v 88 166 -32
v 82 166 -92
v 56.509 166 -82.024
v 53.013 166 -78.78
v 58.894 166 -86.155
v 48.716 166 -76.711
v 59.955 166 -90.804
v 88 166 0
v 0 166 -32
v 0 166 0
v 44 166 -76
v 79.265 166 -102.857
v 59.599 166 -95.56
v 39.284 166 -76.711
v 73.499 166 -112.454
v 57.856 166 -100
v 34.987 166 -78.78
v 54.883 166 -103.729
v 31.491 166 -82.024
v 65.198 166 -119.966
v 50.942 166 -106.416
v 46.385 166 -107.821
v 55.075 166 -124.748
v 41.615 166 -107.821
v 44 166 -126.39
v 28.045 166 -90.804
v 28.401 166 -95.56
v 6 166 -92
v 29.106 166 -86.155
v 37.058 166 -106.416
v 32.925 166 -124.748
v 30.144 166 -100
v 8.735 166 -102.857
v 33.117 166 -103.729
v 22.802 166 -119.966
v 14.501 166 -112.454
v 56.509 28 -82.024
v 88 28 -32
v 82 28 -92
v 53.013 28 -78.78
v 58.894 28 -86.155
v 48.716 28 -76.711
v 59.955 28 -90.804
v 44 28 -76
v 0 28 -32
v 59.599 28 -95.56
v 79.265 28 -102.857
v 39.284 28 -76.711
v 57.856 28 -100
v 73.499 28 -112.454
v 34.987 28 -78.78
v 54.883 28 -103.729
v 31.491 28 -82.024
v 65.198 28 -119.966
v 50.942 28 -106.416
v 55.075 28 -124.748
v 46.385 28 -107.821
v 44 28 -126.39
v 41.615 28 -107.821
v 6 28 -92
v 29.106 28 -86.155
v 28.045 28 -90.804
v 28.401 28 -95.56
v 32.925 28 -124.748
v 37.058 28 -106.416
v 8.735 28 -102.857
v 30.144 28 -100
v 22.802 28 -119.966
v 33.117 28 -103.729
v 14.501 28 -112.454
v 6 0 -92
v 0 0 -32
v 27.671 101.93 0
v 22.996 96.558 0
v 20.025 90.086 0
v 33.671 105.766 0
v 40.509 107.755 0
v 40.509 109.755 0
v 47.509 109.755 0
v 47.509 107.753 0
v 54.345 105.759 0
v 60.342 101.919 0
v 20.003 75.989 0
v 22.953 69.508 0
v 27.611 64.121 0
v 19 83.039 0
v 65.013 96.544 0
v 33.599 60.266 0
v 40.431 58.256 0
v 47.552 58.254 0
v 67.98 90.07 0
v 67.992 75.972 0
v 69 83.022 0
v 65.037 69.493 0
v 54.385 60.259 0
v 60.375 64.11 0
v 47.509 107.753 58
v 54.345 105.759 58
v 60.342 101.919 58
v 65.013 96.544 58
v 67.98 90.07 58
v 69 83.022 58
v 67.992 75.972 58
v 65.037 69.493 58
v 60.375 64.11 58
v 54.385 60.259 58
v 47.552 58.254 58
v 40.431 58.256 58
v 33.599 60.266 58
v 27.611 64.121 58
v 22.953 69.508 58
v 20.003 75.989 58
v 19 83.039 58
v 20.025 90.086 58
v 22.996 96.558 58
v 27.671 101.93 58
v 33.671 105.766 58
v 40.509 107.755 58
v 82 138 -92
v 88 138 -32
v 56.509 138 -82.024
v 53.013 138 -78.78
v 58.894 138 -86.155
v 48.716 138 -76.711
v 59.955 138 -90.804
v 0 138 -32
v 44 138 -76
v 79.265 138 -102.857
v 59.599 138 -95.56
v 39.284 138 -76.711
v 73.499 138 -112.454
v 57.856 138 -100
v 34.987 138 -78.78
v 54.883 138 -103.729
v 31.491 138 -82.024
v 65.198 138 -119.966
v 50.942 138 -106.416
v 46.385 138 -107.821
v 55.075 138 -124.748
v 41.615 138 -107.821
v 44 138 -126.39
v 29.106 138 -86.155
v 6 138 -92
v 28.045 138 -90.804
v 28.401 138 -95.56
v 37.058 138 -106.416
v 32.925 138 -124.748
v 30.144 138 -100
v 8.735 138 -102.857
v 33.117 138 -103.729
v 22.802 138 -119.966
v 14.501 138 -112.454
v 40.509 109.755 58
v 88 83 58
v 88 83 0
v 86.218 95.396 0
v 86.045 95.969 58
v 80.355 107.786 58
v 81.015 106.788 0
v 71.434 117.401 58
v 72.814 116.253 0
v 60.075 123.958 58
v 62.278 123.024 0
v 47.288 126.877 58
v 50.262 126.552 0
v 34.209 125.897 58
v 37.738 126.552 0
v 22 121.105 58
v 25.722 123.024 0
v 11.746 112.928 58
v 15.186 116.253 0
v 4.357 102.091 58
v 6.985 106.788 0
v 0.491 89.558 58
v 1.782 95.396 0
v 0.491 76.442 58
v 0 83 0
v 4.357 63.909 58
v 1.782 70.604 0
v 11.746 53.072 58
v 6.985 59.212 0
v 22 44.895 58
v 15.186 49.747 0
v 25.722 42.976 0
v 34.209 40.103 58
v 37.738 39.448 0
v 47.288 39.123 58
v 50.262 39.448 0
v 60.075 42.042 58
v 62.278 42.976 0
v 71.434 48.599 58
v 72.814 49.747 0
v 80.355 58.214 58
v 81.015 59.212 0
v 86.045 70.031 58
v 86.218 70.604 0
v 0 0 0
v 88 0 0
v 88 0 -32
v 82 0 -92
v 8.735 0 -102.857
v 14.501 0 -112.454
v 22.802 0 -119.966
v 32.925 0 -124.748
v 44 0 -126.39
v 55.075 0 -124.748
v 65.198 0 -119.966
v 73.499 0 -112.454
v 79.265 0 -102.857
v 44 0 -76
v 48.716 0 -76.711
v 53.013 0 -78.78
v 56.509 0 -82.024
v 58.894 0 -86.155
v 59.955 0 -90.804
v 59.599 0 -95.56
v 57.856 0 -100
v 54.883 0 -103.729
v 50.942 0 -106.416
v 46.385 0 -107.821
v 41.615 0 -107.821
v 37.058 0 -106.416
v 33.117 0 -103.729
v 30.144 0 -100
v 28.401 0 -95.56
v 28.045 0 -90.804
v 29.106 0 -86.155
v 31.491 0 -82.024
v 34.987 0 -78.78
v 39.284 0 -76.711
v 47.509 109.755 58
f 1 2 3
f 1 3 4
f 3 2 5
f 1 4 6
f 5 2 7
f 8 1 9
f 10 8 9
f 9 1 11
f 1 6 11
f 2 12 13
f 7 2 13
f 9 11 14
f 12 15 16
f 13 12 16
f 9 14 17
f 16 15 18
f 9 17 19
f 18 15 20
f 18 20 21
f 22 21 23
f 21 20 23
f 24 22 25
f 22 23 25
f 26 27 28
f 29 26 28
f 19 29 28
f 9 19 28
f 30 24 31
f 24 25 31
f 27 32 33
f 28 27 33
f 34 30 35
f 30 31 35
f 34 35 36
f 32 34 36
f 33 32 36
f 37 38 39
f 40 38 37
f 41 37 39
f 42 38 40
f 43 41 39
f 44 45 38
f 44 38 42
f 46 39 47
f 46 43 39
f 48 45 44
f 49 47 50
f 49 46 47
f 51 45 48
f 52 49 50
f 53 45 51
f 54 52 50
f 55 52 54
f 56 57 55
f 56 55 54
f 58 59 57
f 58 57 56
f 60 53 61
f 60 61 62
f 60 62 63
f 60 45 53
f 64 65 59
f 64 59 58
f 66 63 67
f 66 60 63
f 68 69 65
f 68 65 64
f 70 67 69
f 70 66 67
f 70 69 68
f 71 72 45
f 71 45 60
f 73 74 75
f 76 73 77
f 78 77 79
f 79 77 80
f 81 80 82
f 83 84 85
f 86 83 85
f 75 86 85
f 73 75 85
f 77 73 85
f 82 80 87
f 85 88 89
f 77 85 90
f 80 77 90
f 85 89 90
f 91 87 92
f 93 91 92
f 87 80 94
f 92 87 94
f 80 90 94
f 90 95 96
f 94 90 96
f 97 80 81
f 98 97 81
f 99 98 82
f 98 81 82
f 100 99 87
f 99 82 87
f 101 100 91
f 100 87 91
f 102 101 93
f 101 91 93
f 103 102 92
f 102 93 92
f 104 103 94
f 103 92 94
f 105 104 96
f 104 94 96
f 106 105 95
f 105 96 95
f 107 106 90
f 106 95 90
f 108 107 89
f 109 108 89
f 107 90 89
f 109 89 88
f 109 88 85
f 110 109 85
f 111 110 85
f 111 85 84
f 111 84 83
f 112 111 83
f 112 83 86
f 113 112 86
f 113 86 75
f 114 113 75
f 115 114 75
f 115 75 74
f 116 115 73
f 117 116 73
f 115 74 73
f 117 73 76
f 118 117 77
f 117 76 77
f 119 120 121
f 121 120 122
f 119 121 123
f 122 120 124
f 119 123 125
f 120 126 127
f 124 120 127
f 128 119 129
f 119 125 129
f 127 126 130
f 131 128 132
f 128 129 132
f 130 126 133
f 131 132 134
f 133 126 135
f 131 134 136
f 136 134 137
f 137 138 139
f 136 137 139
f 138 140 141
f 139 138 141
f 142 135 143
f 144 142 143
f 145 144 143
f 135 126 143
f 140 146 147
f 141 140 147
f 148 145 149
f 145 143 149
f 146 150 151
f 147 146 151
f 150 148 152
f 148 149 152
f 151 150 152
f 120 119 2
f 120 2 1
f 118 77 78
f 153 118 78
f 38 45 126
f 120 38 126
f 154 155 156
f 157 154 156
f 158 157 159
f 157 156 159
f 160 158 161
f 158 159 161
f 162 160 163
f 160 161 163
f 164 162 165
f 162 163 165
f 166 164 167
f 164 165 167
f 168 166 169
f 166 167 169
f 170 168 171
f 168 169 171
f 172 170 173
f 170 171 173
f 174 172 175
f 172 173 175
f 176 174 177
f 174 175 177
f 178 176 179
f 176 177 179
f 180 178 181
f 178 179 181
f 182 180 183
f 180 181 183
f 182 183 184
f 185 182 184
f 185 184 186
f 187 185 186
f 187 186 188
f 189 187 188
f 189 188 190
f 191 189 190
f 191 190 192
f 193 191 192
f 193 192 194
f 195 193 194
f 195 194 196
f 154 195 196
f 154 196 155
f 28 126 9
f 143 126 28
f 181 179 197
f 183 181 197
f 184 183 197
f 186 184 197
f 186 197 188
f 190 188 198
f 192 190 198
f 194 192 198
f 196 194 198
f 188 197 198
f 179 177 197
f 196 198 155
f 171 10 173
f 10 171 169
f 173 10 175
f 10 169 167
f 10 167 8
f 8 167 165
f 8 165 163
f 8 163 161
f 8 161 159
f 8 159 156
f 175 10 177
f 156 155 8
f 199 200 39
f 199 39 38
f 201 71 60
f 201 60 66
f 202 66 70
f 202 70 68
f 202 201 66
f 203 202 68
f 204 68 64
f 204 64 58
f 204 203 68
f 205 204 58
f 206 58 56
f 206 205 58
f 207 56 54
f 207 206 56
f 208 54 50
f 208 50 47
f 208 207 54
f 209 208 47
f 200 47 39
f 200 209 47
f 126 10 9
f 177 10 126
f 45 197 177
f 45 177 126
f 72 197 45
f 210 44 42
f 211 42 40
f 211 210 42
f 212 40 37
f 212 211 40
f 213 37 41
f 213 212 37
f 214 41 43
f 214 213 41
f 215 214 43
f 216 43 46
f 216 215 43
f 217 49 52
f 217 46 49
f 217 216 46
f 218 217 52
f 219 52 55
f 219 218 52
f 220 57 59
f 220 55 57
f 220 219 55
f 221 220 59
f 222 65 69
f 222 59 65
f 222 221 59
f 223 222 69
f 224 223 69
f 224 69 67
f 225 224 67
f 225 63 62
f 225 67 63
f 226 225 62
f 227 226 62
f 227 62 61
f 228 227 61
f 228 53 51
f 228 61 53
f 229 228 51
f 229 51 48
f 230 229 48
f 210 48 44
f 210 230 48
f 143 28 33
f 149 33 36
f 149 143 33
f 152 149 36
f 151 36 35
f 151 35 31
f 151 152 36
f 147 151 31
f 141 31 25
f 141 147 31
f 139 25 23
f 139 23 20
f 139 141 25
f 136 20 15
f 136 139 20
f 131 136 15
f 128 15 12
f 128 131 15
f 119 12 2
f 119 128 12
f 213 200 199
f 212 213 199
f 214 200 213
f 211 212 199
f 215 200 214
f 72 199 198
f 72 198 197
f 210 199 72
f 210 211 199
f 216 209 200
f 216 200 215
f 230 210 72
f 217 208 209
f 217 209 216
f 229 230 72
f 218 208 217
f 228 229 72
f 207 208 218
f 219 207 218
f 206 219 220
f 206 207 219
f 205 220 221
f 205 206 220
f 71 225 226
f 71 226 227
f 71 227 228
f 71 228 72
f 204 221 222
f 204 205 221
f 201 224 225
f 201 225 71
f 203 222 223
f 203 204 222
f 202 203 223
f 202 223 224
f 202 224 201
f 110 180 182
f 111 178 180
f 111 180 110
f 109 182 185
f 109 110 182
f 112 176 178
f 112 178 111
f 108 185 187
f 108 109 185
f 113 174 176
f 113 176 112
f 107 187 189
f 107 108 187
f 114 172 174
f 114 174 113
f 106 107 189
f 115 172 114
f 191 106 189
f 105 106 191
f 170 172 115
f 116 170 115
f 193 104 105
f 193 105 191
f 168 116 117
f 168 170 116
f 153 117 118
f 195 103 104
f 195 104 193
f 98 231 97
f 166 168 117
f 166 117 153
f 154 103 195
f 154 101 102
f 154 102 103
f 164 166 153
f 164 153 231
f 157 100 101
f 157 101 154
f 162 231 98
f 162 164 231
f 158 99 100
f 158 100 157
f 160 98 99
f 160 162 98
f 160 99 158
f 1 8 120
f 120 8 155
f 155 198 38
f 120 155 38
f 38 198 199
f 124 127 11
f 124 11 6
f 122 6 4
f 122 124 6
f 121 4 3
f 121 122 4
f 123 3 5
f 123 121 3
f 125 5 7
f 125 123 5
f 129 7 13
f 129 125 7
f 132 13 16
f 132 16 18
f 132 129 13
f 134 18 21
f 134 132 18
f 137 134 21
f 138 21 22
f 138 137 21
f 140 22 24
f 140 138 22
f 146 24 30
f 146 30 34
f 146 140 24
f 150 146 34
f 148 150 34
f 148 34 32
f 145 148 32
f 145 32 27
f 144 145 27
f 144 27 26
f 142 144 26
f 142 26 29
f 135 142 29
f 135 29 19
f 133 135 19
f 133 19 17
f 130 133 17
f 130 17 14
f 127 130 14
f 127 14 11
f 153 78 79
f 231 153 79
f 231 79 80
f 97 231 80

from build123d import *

# Parameters (mm, degrees)
SKETCH2_W           = 88
SKETCH2_H           = 32
SKETCH2_R           = 16
BOSS_EXTRUDE2_DEPTH = 166
SKETCH5_W           = 94.38952736
SKETCH5_H           = 110
CUT_EXTRUDE1_DEPTH  = 166
SKETCH6_R           = 44
BOSS_EXTRUDE4_DEPTH = 58


with BuildPart() as part:
    # Sketch2 → Boss-Extrude2 (new body)
    # profile 1 of 2: a face of its own
    with BuildSketch(Plane(origin=(0, 0, 0), x_dir=(1, 0, 0), z_dir=(0, 1, 0))):
        with Locations((44, 16)):
            Rectangle(SKETCH2_W, SKETCH2_H)
    # profile 2 of 2: a face of its own
    with BuildSketch(Plane(origin=(0, 0, 0), x_dir=(1, 0, 0), z_dir=(0, 1, 0))):
        with BuildLine():
            ThreePointArc((6, 92), (44, 126.38952736), (82, 92))
            Line((82, 92), (88, 32))
            Line((88, 32), (0, 32))
            Line((0, 32), (6, 92))
        make_face()
        with Locations(Location((44, 92, 0), (0, 0, 270))):
            Circle(SKETCH2_R, mode=Mode.SUBTRACT)
    extrude(amount=BOSS_EXTRUDE2_DEPTH)

    # Sketch5 → Cut-Extrude1 (cut)
    with BuildSketch(Plane(origin=(0, 0, 0), x_dir=(0, 0, -1), z_dir=(1, 0, 0))):
        with Locations((79.19476368, 83)):
            Rectangle(SKETCH5_W, SKETCH5_H)
    extrude(amount=CUT_EXTRUDE1_DEPTH, mode=Mode.SUBTRACT)

    # Sketch6 → Boss-Extrude4 (add)
    with BuildSketch(Plane.XY):
        with Locations((44, 83)):
            Circle(SKETCH6_R)
        with BuildLine():
            Line((40.50858553, 107.755), (40.50858553, 109.755))
            Line((40.50858553, 109.755), (47.50858553, 109.755))
            Line((47.50858553, 109.755), (47.50858553, 107.752572141))
            ThreePointArc((47.50858553, 107.752572141), (43.991329074, 58.000001504), (40.50858553, 107.755))
        make_face(mode=Mode.SUBTRACT)
    extrude(amount=BOSS_EXTRUDE4_DEPTH)


solid = part.part
